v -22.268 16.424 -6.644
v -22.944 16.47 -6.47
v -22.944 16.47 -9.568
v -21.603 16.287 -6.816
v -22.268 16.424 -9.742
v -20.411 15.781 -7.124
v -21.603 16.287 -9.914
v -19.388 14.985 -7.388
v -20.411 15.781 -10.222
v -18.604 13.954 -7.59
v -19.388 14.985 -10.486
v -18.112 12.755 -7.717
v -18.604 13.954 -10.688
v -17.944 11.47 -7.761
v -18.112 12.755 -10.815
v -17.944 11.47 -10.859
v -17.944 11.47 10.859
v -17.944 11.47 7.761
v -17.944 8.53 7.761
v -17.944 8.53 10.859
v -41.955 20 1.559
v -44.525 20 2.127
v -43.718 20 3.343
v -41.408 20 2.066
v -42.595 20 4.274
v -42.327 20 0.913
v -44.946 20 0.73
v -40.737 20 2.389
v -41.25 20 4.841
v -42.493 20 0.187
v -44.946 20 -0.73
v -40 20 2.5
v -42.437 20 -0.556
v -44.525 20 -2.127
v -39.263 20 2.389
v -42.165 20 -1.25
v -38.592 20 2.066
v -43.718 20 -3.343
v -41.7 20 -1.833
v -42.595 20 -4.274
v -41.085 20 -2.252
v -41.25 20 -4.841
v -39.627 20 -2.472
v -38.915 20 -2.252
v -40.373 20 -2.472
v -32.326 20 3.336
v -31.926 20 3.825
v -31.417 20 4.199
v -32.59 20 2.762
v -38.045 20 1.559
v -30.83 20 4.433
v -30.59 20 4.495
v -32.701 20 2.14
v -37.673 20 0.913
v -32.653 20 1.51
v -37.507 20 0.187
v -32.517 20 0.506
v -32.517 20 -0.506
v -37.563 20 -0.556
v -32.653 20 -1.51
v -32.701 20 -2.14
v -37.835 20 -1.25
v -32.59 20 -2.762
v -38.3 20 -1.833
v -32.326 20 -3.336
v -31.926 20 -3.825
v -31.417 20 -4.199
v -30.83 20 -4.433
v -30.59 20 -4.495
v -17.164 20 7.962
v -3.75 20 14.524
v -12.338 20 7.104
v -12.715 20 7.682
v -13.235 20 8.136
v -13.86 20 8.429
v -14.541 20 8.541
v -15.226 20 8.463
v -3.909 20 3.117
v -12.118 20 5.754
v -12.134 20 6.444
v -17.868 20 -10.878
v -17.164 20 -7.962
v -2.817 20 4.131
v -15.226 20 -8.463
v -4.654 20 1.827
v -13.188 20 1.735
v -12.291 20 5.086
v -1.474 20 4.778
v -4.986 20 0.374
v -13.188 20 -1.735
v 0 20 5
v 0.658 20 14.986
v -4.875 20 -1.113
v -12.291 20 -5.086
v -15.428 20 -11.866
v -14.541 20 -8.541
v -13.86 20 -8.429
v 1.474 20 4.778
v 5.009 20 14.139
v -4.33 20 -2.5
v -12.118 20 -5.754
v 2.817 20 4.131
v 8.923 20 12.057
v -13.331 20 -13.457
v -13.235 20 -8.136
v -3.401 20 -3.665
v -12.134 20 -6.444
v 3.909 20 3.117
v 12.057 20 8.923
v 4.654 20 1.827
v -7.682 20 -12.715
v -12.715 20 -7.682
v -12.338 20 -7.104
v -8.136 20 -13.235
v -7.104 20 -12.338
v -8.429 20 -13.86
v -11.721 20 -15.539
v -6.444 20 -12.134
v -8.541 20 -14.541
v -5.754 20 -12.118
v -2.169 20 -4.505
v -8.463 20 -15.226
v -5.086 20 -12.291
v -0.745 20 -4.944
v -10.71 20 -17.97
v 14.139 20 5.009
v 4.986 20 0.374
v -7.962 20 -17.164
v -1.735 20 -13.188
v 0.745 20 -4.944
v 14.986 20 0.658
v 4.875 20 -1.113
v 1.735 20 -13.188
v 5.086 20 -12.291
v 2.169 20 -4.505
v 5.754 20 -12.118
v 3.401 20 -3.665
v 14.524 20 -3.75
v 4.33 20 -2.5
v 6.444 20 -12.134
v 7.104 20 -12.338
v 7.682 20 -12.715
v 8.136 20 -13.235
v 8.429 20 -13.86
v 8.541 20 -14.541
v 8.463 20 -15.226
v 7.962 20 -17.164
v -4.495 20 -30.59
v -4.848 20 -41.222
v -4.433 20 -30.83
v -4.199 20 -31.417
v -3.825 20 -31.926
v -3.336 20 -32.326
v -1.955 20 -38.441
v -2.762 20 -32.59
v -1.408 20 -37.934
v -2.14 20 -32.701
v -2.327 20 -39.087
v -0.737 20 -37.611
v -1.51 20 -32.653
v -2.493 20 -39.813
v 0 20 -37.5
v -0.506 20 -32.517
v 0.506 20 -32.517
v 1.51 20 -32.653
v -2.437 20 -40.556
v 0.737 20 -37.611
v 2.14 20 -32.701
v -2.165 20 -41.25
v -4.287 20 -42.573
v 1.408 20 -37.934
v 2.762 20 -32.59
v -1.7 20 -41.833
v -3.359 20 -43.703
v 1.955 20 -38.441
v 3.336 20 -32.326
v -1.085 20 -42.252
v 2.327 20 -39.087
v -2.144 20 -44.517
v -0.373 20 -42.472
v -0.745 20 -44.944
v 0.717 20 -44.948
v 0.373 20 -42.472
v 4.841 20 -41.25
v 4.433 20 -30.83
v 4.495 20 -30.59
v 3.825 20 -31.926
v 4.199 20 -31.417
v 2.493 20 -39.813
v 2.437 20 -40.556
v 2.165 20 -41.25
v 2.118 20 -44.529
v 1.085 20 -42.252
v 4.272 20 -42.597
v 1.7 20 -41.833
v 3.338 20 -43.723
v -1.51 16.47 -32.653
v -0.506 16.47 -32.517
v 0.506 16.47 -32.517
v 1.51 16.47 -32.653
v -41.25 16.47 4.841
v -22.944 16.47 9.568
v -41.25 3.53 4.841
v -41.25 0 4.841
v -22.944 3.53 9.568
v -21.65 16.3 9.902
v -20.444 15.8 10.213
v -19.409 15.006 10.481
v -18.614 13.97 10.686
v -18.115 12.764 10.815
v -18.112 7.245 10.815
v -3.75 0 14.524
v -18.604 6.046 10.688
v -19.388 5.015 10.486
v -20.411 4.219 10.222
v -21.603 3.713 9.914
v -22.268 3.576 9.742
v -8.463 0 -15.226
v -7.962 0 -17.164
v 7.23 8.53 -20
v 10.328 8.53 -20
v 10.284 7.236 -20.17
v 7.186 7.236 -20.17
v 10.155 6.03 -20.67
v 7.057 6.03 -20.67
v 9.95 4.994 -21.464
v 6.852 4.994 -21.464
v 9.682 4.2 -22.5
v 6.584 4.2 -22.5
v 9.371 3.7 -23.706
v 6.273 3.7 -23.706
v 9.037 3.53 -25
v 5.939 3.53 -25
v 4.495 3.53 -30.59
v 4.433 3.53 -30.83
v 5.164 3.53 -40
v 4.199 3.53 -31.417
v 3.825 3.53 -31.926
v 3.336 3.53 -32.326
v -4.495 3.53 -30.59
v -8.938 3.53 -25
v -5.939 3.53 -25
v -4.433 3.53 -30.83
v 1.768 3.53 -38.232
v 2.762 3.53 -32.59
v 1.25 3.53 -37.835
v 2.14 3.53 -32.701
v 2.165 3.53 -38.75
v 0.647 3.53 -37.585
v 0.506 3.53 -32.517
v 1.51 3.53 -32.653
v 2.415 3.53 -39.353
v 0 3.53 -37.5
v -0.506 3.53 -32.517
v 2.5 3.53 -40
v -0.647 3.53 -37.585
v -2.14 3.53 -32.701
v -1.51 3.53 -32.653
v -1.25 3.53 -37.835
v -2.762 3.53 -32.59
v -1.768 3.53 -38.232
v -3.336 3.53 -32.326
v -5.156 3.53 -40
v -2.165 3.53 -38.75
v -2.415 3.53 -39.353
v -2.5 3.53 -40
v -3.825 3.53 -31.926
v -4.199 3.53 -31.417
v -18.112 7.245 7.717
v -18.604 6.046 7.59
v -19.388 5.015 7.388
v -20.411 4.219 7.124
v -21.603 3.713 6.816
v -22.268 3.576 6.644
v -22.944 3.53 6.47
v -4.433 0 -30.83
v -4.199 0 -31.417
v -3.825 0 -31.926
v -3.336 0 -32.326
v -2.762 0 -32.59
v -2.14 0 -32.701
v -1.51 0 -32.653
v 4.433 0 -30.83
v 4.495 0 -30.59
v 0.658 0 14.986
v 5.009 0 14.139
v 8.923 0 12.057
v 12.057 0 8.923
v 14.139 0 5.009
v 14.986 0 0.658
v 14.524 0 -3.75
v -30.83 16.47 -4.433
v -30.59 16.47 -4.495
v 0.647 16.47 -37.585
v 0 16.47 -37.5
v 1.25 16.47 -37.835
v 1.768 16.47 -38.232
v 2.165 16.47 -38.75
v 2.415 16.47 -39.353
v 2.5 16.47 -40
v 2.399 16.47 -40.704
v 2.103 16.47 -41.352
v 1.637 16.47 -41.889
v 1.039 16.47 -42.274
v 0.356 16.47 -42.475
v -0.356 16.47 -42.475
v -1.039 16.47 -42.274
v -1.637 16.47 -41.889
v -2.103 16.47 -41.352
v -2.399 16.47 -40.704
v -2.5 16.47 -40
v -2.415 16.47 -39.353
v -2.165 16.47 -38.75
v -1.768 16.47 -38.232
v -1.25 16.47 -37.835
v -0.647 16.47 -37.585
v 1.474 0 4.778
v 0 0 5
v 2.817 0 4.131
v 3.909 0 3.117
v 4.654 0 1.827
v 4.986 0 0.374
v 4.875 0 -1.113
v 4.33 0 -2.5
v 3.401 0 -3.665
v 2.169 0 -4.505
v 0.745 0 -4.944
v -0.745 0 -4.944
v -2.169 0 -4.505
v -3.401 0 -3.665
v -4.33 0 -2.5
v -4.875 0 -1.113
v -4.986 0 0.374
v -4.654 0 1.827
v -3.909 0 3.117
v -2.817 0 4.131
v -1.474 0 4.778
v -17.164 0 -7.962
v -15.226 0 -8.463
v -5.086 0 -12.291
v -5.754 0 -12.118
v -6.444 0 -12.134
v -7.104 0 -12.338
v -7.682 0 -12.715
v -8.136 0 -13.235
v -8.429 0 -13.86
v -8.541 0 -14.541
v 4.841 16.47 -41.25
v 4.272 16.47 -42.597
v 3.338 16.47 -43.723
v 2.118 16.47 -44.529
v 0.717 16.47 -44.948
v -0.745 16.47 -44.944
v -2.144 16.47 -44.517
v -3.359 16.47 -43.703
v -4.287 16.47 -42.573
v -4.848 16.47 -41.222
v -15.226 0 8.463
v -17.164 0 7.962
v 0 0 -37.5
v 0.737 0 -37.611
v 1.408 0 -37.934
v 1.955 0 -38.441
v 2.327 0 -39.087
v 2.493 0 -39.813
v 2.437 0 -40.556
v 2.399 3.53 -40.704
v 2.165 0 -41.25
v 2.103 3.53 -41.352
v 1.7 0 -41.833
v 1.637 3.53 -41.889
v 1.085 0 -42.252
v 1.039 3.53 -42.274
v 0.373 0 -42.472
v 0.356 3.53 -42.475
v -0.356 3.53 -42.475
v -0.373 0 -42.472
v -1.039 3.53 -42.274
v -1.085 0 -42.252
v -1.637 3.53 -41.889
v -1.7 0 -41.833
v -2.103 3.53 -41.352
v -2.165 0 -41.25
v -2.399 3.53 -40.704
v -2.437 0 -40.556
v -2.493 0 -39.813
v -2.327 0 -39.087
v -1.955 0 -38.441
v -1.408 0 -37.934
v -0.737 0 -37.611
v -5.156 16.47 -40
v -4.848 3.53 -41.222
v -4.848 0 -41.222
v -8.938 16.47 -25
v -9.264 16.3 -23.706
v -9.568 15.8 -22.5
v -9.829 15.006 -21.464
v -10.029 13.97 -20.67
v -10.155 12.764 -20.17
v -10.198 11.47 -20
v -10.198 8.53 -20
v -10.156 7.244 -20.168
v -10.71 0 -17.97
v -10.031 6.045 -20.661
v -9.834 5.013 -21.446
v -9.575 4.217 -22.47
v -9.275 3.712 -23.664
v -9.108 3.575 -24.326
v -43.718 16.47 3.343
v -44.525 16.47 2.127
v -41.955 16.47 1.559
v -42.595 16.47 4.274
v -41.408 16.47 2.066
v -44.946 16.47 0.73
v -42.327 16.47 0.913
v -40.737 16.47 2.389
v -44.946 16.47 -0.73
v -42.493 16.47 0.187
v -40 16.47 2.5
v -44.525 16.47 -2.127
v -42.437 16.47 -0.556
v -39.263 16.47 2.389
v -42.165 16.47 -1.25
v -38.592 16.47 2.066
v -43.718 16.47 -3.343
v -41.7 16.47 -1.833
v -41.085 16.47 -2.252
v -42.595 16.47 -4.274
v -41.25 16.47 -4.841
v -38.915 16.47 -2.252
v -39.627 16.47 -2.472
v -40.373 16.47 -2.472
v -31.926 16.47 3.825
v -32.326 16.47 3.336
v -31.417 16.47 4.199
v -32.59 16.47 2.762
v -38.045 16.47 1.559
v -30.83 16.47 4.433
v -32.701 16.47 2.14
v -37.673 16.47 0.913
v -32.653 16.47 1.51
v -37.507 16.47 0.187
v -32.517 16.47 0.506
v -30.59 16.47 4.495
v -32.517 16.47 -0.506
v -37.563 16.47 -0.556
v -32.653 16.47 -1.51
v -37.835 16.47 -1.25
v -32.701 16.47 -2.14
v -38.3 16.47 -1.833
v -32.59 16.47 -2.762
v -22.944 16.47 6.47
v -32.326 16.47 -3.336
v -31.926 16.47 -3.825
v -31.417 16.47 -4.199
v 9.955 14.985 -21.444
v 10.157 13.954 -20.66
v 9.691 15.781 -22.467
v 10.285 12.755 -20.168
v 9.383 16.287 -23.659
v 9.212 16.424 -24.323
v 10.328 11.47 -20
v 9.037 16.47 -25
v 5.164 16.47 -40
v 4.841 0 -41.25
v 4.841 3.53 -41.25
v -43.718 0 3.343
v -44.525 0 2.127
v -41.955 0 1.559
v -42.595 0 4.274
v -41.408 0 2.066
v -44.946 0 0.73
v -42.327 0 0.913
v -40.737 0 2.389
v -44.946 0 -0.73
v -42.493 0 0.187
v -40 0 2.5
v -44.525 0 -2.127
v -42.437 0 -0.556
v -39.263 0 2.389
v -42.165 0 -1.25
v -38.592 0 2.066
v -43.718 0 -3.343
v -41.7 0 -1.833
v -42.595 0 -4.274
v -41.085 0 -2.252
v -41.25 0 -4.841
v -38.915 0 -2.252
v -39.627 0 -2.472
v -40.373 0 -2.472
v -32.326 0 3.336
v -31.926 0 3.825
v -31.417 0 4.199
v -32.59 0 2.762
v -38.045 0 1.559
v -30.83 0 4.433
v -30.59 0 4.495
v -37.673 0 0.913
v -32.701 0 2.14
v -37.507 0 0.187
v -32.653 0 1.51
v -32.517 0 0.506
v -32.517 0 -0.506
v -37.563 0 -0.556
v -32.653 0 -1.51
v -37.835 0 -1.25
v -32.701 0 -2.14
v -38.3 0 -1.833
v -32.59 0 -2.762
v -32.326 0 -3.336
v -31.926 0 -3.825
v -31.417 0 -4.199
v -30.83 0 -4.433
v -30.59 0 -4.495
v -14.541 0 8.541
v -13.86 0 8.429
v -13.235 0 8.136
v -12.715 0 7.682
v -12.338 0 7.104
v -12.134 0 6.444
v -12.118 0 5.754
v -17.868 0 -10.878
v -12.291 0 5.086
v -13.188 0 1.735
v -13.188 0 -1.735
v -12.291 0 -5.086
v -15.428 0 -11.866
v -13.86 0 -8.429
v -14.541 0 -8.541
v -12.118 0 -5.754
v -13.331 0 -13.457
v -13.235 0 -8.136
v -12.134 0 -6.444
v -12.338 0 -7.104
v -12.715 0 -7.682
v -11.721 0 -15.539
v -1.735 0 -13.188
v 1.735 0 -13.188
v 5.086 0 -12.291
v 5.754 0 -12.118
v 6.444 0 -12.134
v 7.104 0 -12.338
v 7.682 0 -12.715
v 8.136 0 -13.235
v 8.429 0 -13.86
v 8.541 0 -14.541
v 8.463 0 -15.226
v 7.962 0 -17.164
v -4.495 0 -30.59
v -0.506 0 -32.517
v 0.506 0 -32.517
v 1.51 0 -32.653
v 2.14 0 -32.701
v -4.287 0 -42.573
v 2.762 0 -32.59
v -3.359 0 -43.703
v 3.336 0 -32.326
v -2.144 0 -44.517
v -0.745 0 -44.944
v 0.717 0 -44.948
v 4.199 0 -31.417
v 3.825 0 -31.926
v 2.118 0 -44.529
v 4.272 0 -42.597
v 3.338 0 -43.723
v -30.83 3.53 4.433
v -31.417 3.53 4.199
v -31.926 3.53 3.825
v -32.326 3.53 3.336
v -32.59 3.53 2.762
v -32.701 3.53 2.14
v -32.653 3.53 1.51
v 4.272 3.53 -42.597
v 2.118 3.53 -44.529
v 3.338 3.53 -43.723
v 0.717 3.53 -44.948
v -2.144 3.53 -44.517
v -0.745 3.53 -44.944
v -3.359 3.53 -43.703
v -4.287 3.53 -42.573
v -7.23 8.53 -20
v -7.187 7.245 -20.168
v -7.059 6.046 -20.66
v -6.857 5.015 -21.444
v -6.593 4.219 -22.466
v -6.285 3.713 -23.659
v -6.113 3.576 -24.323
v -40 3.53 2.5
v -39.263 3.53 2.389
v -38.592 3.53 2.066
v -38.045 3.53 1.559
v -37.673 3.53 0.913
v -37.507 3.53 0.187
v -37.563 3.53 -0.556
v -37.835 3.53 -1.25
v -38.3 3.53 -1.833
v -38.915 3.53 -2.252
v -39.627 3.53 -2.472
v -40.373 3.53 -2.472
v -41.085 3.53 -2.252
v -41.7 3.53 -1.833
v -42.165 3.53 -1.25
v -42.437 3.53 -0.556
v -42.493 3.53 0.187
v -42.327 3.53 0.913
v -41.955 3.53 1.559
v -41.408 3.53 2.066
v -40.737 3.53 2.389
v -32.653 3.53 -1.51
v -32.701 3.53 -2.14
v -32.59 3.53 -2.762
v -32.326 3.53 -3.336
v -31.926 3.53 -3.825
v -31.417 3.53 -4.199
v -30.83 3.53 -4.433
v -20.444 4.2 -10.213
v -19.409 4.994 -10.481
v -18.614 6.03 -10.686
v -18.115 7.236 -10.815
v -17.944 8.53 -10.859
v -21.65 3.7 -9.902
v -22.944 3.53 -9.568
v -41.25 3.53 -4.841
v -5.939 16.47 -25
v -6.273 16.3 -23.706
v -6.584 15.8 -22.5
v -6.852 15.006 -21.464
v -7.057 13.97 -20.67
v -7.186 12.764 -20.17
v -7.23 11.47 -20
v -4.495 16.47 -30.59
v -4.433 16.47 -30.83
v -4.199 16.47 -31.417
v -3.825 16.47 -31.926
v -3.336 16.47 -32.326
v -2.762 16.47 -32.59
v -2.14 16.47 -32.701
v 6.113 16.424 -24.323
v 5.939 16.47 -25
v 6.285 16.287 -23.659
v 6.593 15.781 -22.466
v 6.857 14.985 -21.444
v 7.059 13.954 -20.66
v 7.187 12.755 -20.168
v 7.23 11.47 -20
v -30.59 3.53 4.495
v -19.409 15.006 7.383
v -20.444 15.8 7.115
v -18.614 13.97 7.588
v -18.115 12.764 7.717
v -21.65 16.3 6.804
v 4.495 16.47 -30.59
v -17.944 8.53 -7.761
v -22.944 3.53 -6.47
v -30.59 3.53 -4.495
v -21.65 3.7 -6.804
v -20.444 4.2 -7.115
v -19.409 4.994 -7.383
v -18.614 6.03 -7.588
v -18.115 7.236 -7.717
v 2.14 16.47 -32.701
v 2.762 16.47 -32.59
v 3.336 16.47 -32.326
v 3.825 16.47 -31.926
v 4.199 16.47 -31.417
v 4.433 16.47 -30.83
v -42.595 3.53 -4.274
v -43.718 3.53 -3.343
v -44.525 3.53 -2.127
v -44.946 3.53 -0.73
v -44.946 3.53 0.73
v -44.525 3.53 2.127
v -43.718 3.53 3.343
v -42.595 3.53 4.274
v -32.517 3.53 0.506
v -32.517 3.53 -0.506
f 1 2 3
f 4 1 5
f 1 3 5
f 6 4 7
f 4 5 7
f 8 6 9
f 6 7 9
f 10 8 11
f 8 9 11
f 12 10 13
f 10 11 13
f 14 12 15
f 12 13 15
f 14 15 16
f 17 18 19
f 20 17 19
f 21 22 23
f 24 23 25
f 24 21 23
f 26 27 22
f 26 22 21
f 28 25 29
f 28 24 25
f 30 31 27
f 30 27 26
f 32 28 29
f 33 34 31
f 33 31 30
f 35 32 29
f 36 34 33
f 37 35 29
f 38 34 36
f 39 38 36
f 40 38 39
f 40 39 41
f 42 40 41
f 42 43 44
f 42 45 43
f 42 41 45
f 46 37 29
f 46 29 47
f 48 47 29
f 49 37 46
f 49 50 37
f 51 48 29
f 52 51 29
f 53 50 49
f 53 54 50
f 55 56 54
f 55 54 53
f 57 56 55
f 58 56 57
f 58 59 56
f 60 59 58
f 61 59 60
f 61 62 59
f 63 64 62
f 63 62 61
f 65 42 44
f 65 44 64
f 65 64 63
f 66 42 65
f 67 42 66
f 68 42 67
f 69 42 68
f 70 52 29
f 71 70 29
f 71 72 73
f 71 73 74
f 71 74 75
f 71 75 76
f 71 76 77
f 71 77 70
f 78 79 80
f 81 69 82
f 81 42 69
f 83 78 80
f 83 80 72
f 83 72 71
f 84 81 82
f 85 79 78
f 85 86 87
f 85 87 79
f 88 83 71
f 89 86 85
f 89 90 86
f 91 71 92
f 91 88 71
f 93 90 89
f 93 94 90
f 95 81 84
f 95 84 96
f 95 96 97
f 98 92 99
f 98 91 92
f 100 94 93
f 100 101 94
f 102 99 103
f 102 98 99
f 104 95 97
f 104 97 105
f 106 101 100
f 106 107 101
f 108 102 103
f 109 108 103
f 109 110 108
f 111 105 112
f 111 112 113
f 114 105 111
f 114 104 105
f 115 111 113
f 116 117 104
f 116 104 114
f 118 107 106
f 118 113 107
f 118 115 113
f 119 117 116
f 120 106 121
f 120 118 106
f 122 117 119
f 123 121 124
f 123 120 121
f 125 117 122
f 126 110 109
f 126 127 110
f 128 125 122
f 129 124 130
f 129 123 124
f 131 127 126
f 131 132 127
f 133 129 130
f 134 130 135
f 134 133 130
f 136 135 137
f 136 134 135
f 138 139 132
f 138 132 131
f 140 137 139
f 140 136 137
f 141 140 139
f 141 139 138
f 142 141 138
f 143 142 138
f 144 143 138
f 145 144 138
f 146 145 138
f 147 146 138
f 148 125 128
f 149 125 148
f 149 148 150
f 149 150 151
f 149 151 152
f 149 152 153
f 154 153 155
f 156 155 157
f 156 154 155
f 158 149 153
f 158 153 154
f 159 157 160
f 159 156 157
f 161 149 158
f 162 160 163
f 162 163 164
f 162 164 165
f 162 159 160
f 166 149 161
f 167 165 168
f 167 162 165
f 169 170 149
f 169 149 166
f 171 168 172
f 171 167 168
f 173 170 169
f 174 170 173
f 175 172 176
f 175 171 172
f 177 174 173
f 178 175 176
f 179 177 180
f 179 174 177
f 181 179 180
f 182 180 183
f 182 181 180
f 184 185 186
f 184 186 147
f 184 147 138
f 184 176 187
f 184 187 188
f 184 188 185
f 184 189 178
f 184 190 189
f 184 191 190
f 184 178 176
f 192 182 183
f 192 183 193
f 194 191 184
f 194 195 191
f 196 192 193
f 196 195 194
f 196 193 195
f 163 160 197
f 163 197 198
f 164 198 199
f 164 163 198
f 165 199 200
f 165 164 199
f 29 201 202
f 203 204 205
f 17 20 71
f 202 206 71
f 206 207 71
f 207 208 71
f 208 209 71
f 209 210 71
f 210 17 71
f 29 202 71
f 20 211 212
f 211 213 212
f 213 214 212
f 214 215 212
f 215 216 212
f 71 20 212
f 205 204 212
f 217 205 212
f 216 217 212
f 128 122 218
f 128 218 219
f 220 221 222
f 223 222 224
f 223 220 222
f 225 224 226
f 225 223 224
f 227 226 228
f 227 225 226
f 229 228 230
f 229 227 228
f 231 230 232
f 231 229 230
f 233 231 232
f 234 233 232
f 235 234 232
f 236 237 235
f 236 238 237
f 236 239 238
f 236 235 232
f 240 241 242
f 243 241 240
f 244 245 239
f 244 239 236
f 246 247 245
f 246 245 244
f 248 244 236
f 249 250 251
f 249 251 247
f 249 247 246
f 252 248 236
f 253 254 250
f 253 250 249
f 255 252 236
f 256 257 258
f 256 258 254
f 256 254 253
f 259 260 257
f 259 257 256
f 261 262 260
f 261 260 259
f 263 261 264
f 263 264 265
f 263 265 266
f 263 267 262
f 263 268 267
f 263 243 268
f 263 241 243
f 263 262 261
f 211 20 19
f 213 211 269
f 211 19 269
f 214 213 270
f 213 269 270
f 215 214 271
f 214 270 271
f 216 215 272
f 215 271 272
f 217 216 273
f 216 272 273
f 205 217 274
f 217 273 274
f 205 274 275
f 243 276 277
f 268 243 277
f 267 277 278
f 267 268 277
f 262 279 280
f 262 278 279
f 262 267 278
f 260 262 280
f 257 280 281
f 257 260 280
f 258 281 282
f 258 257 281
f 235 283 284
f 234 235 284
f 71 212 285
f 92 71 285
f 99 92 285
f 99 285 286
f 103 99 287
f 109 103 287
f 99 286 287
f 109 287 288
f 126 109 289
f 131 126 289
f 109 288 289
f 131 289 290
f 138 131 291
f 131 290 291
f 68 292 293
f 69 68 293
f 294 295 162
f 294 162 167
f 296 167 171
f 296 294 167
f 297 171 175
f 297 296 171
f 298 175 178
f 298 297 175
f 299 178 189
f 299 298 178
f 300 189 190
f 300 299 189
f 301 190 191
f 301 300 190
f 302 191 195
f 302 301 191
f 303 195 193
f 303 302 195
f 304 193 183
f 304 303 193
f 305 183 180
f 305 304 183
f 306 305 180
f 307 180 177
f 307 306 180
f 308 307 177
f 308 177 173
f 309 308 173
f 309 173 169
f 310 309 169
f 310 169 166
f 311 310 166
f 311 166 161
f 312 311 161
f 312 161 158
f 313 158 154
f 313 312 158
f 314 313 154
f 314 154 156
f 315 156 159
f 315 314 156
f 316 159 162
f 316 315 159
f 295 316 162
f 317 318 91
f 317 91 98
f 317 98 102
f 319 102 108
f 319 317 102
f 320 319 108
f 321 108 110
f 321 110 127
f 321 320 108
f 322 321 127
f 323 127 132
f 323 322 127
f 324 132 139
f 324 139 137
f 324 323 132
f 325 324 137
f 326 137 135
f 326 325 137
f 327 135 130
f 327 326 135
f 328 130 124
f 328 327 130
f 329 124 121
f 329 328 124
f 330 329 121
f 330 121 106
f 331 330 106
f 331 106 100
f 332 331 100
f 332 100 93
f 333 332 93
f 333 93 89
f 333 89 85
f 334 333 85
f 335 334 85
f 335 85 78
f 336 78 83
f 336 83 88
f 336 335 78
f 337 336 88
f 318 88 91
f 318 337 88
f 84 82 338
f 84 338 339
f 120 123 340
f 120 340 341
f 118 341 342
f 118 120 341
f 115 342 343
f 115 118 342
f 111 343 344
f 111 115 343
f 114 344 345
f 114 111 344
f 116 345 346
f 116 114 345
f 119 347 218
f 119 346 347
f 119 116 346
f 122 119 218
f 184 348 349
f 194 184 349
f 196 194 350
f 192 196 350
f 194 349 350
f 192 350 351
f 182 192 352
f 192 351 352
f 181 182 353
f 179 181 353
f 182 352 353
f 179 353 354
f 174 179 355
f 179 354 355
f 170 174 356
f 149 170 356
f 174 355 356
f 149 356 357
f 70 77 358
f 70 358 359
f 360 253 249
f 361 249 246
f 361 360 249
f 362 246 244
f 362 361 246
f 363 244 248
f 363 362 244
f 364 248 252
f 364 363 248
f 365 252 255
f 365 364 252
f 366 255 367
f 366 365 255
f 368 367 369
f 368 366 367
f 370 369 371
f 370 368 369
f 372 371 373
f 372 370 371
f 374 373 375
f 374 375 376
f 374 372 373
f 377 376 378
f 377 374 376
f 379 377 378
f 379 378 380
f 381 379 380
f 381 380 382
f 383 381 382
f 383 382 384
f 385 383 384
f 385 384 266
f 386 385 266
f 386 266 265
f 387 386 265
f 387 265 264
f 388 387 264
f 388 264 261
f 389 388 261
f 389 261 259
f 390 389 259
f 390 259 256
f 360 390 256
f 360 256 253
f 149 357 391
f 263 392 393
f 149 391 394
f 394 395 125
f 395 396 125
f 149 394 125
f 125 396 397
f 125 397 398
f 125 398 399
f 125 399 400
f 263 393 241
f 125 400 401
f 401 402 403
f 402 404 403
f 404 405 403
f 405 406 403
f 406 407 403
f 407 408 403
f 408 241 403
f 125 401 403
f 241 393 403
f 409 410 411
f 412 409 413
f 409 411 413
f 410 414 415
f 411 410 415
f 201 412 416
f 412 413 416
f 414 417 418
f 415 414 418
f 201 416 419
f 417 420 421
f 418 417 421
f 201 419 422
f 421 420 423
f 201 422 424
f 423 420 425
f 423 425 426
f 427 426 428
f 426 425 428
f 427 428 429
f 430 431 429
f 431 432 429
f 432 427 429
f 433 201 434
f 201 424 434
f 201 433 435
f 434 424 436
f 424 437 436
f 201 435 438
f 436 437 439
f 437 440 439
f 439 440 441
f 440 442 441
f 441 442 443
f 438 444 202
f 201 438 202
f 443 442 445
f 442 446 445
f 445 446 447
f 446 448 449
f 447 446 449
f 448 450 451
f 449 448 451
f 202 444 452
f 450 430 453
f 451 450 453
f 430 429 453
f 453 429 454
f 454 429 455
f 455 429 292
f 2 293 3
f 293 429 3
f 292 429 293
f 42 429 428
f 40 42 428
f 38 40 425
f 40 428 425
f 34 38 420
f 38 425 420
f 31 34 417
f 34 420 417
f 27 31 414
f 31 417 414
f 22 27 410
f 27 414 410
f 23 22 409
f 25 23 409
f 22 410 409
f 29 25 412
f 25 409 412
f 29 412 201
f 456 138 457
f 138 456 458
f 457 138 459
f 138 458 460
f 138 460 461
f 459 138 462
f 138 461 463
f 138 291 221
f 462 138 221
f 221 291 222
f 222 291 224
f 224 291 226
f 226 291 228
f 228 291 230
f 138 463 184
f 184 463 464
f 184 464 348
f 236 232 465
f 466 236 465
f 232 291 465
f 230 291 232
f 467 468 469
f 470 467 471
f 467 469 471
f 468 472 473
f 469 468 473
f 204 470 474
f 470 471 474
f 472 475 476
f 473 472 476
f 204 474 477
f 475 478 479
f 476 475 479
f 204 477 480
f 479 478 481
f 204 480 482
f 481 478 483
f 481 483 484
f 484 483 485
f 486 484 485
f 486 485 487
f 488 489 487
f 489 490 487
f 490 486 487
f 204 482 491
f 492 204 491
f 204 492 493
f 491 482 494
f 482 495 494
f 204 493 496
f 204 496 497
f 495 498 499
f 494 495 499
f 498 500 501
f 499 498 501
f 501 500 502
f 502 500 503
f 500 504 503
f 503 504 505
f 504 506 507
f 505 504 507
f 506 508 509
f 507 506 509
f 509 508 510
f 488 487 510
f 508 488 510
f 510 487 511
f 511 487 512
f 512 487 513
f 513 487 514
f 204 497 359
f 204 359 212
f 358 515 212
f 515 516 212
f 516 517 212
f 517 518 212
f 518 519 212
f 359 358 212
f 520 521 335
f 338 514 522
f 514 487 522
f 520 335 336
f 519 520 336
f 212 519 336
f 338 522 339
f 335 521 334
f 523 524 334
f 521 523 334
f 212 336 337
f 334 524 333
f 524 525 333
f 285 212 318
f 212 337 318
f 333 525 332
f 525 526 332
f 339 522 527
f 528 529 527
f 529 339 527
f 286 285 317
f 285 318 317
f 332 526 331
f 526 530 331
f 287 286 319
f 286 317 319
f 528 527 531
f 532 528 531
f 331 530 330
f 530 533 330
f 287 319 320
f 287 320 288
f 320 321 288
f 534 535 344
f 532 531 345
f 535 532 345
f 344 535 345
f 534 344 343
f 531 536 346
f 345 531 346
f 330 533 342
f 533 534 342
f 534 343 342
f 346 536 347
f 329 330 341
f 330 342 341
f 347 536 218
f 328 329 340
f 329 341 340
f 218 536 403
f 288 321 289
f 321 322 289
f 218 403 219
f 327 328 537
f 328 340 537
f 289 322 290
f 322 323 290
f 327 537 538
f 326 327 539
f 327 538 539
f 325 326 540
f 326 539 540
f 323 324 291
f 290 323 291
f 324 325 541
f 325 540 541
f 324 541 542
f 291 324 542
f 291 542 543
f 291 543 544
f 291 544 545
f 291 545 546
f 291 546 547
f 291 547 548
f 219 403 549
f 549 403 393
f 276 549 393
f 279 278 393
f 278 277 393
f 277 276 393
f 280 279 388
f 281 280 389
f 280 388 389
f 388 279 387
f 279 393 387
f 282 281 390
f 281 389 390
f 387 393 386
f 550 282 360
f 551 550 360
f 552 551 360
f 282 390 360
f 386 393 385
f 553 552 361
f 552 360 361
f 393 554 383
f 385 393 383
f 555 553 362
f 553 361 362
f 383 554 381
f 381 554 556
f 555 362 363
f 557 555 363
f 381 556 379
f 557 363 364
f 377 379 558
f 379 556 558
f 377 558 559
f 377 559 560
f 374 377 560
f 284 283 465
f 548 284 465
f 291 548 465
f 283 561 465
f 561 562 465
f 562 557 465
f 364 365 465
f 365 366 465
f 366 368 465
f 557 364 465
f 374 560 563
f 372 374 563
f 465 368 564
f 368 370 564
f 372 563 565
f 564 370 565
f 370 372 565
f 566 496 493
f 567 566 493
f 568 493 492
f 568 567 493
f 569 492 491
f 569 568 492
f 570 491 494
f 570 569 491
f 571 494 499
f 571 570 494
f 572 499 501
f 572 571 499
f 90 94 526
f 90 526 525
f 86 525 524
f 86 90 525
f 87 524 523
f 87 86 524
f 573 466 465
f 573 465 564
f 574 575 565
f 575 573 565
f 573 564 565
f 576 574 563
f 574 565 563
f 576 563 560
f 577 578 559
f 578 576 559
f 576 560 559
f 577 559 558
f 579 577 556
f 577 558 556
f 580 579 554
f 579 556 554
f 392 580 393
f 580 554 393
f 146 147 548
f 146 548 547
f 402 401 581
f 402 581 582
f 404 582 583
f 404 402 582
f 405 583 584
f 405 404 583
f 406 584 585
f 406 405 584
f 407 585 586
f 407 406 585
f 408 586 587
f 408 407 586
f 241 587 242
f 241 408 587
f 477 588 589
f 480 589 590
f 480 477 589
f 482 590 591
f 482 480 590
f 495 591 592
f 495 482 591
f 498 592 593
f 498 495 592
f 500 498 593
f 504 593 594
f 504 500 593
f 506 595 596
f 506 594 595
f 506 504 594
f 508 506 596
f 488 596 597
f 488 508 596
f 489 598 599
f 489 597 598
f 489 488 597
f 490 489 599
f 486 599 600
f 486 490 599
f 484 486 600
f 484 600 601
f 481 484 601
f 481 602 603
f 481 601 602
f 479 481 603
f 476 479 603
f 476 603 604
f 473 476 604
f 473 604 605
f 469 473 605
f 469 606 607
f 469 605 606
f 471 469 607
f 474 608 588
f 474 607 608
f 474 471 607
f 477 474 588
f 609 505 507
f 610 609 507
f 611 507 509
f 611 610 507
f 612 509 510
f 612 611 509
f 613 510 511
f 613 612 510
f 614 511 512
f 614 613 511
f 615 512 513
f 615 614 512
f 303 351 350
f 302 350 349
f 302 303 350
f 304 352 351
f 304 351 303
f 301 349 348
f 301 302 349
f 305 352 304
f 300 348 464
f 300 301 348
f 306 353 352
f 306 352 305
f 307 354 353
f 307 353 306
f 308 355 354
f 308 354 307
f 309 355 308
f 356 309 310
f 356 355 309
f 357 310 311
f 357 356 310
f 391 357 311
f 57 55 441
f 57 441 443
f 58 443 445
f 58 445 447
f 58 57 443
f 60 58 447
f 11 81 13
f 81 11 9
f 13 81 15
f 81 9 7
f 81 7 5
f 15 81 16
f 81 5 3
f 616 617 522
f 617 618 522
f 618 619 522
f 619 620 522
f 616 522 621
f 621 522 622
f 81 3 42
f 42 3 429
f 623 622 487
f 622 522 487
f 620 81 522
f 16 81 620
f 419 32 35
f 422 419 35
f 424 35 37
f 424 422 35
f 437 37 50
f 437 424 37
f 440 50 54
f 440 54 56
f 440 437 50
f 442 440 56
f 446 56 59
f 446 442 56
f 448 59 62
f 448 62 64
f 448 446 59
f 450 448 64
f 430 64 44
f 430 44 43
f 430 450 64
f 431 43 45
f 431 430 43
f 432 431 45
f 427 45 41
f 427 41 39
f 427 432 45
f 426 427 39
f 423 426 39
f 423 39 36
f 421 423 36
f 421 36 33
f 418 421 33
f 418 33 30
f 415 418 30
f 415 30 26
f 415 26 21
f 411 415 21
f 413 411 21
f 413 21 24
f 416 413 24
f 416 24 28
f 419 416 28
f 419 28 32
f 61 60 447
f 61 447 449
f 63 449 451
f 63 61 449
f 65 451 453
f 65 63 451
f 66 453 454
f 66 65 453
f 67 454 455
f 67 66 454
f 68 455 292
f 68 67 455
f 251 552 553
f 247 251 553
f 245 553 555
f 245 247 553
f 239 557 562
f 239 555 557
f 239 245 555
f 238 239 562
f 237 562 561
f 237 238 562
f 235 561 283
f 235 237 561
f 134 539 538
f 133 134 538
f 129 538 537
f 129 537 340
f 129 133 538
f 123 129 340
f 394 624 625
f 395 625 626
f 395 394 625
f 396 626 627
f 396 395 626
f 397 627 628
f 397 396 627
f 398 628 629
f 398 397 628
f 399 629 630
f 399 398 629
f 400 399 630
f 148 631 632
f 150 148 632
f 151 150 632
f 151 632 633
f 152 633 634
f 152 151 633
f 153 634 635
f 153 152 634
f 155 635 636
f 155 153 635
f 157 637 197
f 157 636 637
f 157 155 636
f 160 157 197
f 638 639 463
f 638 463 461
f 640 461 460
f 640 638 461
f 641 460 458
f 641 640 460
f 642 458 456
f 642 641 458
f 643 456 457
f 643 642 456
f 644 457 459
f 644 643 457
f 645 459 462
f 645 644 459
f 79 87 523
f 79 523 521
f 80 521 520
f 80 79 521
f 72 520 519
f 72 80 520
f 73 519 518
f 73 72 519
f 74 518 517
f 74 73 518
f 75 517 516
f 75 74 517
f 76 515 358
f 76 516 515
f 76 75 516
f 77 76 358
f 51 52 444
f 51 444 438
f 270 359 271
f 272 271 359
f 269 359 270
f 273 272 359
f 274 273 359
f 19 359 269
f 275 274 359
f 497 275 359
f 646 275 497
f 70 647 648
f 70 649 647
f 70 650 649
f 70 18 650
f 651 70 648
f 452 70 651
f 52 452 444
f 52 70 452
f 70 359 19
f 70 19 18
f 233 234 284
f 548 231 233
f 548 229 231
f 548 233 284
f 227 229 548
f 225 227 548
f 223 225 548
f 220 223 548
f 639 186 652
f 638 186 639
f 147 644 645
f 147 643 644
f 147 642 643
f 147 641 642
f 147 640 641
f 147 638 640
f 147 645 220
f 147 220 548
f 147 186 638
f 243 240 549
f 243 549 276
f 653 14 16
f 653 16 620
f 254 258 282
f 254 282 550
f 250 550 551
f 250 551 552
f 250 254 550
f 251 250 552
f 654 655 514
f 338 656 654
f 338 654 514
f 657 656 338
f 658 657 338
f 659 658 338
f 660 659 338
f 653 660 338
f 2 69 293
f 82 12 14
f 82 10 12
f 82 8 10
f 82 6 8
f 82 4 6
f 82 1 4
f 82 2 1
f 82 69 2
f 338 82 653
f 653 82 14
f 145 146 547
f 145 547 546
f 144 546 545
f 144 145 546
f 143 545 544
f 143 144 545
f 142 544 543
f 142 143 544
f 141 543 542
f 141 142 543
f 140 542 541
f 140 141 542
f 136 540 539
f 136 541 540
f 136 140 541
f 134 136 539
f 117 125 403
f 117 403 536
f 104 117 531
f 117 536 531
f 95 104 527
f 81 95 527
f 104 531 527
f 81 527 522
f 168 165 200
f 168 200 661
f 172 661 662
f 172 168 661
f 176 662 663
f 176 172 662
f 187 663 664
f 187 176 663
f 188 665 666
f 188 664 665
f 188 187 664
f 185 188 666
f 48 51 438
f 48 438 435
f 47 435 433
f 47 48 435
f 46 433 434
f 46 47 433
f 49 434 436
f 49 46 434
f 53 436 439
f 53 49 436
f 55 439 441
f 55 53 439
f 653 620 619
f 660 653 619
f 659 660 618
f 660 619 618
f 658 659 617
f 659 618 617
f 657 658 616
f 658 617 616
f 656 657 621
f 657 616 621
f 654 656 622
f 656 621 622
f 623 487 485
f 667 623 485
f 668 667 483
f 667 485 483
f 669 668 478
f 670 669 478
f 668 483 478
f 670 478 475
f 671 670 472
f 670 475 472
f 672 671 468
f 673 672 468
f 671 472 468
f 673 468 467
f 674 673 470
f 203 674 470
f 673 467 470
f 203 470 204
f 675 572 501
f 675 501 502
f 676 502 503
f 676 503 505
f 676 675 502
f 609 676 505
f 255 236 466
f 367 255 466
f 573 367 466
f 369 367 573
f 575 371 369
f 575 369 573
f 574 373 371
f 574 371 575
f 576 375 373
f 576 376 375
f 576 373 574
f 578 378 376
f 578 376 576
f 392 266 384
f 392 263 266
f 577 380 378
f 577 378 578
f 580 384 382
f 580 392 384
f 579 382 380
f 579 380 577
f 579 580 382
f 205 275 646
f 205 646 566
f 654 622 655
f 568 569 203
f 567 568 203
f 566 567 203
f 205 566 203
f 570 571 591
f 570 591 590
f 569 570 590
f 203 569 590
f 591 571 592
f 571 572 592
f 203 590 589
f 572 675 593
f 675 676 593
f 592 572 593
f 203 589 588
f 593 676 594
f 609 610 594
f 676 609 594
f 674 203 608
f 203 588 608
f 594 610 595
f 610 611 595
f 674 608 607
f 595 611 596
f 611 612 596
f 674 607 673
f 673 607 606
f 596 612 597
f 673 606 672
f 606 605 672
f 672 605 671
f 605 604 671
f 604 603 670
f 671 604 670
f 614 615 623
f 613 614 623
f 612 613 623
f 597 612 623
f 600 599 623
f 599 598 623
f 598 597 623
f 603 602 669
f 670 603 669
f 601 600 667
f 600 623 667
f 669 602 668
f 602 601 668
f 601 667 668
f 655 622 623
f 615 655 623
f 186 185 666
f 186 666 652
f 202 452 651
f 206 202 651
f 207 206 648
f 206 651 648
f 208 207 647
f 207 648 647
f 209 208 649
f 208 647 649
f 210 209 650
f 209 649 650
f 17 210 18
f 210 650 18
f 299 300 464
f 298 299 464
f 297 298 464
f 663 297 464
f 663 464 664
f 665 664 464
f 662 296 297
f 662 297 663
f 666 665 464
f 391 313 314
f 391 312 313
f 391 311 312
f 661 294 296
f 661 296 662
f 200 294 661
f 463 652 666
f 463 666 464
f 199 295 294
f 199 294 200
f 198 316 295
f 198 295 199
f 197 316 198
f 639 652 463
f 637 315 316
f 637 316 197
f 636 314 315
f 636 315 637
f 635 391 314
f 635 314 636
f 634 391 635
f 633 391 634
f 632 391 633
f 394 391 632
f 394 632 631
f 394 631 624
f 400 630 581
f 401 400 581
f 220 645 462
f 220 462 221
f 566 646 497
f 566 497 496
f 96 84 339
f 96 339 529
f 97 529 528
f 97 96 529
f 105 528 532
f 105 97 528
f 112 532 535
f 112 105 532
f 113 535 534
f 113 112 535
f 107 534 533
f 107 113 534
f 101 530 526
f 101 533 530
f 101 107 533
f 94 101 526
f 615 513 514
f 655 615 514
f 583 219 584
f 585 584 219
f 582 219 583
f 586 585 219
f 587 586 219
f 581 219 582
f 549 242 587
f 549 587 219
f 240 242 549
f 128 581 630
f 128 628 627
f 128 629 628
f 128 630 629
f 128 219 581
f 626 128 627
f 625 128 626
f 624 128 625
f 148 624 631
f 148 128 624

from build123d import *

# Parameters (mm, degrees)
SKETCH1_R               = 5
SKETCH1_R_2             = 2.5
BOSS_EXTRUDE1_DEPTH     = 20
CUT_EXTRUDE1_DEPTH      = 73.947048844
CUT_EXTRUDE1_DEPTH_BACK = 73.947048844
CUT_EXTRUDE2_DEPTH      = 87.382039929
CUT_EXTRUDE2_DEPTH_BACK = 87.382039929
CUT_EXTRUDE3_DEPTH      = 67.708320321
CIRPATTERN1_COUNT       = 2
CIRPATTERN1_ANGLE       = 90


with BuildPart() as part:
    # Sketch1 → Boss-Extrude1 (new body)
    with BuildSketch(Plane(origin=(0, 0, 0), x_dir=(1, 0, 0), z_dir=(0, 1, 0))):
        with BuildLine():
            Line((-41.25, -4.841229183), (-3.75, -14.523687548))
            ThreePointArc((-3.75, -14.523687548), (10.606601718, -10.606601718), (14.523687548, 3.75))
            Line((14.523687548, 3.75), (4.841229183, 41.25))
            ThreePointArc((4.841229183, 41.25), (-0.014355404, 44.999979392), (-4.848327042, 41.222180386))
            Line((-4.848327042, 41.222180386), (-10.709838692, 17.969863651))
            ThreePointArc((-10.709838692, 17.969863651), (-13.330617196, 13.456564929), (-17.868360534, 10.878342533))
            Line((-17.868360534, 10.878342533), (-41.25, 4.841229183))
            ThreePointArc((-41.25, 4.841229183), (-45, 0), (-41.25, -4.841229183))
        make_face()
        with Locations(Location((0, 0, 0), (0, 0, 270))):
            Circle(SKETCH1_R, mode=Mode.SUBTRACT)
        with Locations(Location((0, 40, 0), (0, 0, 270))):
            Circle(SKETCH1_R_2, mode=Mode.SUBTRACT)
        with Locations(Location((-40, 0, 0), (0, 0, 270))):
            Circle(SKETCH1_R_2, mode=Mode.SUBTRACT)
    extrude(amount=BOSS_EXTRUDE1_DEPTH)

    # 3DSketch4 → Cut-Extrude1 (cut, two sides)
    with BuildSketch(Plane(origin=(0, 16.470335, -40), x_dir=(0, -0.36901261681753356, 0.9294243856438652), z_dir=(1, 0, 0))) as cut_extrude1_sk:
        with BuildLine():
            Line((0, 0), (13.941365785, -5.535189252))
            ThreePointArc((13.941365785, -5.535189252), (17.767783679, -5.478735371), (20.433550797, -2.733130408))
            Line((20.433550797, -2.733130408), (21.518695129, 0))
            ThreePointArc((21.518695129, 0), (21.462241248, 3.826417894), (18.716636285, 6.492185012))
            Line((18.716636285, 6.492185012), (4.7752705, 12.027374265))
            Line((4.7752705, 12.027374265), (-8.558795166, 17.321445025))
            Line((-8.558795166, 17.321445025), (-13.334065667, 5.294070761))
            Line((-13.334065667, 5.294070761), (0, 0))
        make_face()
    extrude(amount=CUT_EXTRUDE1_DEPTH, mode=Mode.SUBTRACT)
    extrude(cut_extrude1_sk.sketch, amount=-CUT_EXTRUDE1_DEPTH_BACK, mode=Mode.SUBTRACT)

    # 3DSketch5 → Cut-Extrude2 (cut, two sides)
    with BuildSketch(Plane(origin=(-56.872003502, 16.470335, 0), x_dir=(0.9798226496463329, -0.1998688951288811, 0), z_dir=(0, 0, -1))) as cut_extrude2_sk:
        with BuildLine():
            Line((0, 0), (33.243187397, -6.781103844))
            ThreePointArc((33.243187397, -6.781103844), (37.000084817, -6.052830051), (39.141645121, -2.881335071))
            Line((39.141645121, -2.881335071), (39.729393585, 0))
            ThreePointArc((39.729393585, 0), (39.001119792, 3.75689742), (35.829624813, 5.898457724))
            Line((35.829624813, 5.898457724), (2.586437415, 12.679561568))
            Line((2.586437415, 12.679561568), (0, 0))
        make_face()
    extrude(amount=CUT_EXTRUDE2_DEPTH, mode=Mode.SUBTRACT)
    extrude(cut_extrude2_sk.sketch, amount=-CUT_EXTRUDE2_DEPTH_BACK, mode=Mode.SUBTRACT)

    # Sketch2 → Cut-Extrude3 (cut, through all)
    with BuildSketch(Plane(origin=(0, 20, 0), x_dir=(1, 0, 0), z_dir=(0, 1, 0))):
        with BuildLine():
            Line((-30.589723784, 4.495313989), (-17.164379291, 7.962110305))
            Line((-17.164379291, 7.962110305), (-15.226453583, 8.462536474))
            ThreePointArc((-15.226453583, 8.462536474), (-12.714609551, 7.682081043), (-12.291345207, 5.086061319))
            ThreePointArc((-12.291345207, 5.086061319), (-13.302074527, 0), (-12.291345207, -5.086061319))
            ThreePointArc((-12.291345207, -5.086061319), (-12.714609551, -7.682081043), (-15.226453583, -8.462536474))
            Line((-15.226453583, -8.462536474), (-17.164379291, -7.962110305))
            Line((-17.164379291, -7.962110305), (-30.589723784, -4.495313989))
            Line((-30.589723784, -4.495313989), (-30.829716392, -4.433341241))
            ThreePointArc((-30.829716392, -4.433341241), (-32.325817378, -3.33586596), (-32.653488198, -1.509557665))
            ThreePointArc((-32.653488198, -1.509557665), (-32.5, 0), (-32.653488198, 1.509557665))
            ThreePointArc((-32.653488198, 1.509557665), (-32.325817378, 3.33586596), (-30.829716392, 4.433341241))
            Line((-30.829716392, 4.433341241), (-30.589723784, 4.495313989))
        make_face()
    cut_extrude3 = extrude(amount=-CUT_EXTRUDE3_DEPTH, mode=Mode.SUBTRACT)

    # CirPattern1: Cut-Extrude3 ×2 about axis
    cirpattern1_axis = Axis((0, 0, 0), (0, -1, 0))
    for i in range(1, CIRPATTERN1_COUNT):
        add(cut_extrude3.rotate(cirpattern1_axis, i * CIRPATTERN1_ANGLE / (CIRPATTERN1_COUNT - 1)), mode=Mode.SUBTRACT)


solid = part.part
